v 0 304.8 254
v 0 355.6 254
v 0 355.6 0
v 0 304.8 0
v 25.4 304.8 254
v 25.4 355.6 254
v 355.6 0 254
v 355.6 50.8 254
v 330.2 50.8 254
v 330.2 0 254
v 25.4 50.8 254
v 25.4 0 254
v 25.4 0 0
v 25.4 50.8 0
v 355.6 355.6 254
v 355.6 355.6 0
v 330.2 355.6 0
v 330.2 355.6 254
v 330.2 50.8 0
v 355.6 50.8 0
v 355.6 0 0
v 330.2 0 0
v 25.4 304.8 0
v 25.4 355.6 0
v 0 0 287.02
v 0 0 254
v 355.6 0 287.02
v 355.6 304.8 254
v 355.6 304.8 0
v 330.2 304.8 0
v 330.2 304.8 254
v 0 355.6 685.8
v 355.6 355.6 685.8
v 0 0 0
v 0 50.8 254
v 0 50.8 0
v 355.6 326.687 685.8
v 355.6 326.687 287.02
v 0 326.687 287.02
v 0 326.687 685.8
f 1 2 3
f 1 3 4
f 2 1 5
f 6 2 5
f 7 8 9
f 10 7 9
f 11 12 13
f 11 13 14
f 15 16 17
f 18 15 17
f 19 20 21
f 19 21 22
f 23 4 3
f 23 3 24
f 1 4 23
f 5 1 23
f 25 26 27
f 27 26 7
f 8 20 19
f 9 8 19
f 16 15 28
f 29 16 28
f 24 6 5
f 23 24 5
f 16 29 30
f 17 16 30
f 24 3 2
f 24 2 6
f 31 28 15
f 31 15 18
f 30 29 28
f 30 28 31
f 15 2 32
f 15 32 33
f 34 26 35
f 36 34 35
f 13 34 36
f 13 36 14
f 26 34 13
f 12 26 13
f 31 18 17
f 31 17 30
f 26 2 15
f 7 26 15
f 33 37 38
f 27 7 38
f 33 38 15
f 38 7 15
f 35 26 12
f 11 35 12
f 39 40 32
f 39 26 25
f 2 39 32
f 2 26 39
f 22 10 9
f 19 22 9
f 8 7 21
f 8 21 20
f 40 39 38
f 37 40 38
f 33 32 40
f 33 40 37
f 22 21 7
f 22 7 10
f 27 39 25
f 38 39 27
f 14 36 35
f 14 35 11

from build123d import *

# Parameters (mm, degrees)
F0_W     = 25.4
F0_H     = 50.8
F1_DEPTH = 254
F2_W     = 355.6
F2_H     = 177.8
F2_W_2   = 25.4
F2_H_2   = 50.8
F5_DEPTH = 33.02
F8_W     = 355.6
F8_H     = 28.9133196831
F9_DEPTH = 398.78


with BuildPart() as f1:
    # F0 (on Top) → F1 (new body)
    with BuildSketch(Plane.XY):
        with Locations((12.7, 25.4)):
            Rectangle(F0_W, F0_H)
    extrude(amount=F1_DEPTH)


with BuildPart() as f4_1:
    # F4: instance of F1
    add(f1.part.mirror(Plane.YZ.offset(177.8)))


with BuildPart() as f5:
    # F2 (on face) → F5 (new body)
    with BuildSketch(Plane.XY.offset(254)):
        with Locations((177.8, 266.7)):
            Rectangle(F2_W, F2_H)
        Polygon((25.4, 50.8), (25.4, 0), (355.6, 0), (355.6, 177.8), (0, 177.8), (0, 50.8), align=None)
        with Locations((12.7, 25.4)):
            Rectangle(F2_W_2, F2_H_2)
    extrude(amount=F5_DEPTH)

    # F8 (on face) → F9 (join)
    with BuildSketch(Plane.XY.offset(287.02)):
        with Locations((177.8, 341.1433401585)):
            Rectangle(F8_W, F8_H)
    extrude(amount=F9_DEPTH)


with BuildPart() as f7_1:
    # F7: instance of F1
    add(f1.part.mirror(Plane.XZ.offset(-177.8)))


with BuildPart() as f7_2:
    # F7: instance of F4_1
    add(f4_1.part.mirror(Plane.XZ.offset(-177.8)))


solid = Compound([f1.part, f4_1.part, f5.part, f7_1.part, f7_2.part])
